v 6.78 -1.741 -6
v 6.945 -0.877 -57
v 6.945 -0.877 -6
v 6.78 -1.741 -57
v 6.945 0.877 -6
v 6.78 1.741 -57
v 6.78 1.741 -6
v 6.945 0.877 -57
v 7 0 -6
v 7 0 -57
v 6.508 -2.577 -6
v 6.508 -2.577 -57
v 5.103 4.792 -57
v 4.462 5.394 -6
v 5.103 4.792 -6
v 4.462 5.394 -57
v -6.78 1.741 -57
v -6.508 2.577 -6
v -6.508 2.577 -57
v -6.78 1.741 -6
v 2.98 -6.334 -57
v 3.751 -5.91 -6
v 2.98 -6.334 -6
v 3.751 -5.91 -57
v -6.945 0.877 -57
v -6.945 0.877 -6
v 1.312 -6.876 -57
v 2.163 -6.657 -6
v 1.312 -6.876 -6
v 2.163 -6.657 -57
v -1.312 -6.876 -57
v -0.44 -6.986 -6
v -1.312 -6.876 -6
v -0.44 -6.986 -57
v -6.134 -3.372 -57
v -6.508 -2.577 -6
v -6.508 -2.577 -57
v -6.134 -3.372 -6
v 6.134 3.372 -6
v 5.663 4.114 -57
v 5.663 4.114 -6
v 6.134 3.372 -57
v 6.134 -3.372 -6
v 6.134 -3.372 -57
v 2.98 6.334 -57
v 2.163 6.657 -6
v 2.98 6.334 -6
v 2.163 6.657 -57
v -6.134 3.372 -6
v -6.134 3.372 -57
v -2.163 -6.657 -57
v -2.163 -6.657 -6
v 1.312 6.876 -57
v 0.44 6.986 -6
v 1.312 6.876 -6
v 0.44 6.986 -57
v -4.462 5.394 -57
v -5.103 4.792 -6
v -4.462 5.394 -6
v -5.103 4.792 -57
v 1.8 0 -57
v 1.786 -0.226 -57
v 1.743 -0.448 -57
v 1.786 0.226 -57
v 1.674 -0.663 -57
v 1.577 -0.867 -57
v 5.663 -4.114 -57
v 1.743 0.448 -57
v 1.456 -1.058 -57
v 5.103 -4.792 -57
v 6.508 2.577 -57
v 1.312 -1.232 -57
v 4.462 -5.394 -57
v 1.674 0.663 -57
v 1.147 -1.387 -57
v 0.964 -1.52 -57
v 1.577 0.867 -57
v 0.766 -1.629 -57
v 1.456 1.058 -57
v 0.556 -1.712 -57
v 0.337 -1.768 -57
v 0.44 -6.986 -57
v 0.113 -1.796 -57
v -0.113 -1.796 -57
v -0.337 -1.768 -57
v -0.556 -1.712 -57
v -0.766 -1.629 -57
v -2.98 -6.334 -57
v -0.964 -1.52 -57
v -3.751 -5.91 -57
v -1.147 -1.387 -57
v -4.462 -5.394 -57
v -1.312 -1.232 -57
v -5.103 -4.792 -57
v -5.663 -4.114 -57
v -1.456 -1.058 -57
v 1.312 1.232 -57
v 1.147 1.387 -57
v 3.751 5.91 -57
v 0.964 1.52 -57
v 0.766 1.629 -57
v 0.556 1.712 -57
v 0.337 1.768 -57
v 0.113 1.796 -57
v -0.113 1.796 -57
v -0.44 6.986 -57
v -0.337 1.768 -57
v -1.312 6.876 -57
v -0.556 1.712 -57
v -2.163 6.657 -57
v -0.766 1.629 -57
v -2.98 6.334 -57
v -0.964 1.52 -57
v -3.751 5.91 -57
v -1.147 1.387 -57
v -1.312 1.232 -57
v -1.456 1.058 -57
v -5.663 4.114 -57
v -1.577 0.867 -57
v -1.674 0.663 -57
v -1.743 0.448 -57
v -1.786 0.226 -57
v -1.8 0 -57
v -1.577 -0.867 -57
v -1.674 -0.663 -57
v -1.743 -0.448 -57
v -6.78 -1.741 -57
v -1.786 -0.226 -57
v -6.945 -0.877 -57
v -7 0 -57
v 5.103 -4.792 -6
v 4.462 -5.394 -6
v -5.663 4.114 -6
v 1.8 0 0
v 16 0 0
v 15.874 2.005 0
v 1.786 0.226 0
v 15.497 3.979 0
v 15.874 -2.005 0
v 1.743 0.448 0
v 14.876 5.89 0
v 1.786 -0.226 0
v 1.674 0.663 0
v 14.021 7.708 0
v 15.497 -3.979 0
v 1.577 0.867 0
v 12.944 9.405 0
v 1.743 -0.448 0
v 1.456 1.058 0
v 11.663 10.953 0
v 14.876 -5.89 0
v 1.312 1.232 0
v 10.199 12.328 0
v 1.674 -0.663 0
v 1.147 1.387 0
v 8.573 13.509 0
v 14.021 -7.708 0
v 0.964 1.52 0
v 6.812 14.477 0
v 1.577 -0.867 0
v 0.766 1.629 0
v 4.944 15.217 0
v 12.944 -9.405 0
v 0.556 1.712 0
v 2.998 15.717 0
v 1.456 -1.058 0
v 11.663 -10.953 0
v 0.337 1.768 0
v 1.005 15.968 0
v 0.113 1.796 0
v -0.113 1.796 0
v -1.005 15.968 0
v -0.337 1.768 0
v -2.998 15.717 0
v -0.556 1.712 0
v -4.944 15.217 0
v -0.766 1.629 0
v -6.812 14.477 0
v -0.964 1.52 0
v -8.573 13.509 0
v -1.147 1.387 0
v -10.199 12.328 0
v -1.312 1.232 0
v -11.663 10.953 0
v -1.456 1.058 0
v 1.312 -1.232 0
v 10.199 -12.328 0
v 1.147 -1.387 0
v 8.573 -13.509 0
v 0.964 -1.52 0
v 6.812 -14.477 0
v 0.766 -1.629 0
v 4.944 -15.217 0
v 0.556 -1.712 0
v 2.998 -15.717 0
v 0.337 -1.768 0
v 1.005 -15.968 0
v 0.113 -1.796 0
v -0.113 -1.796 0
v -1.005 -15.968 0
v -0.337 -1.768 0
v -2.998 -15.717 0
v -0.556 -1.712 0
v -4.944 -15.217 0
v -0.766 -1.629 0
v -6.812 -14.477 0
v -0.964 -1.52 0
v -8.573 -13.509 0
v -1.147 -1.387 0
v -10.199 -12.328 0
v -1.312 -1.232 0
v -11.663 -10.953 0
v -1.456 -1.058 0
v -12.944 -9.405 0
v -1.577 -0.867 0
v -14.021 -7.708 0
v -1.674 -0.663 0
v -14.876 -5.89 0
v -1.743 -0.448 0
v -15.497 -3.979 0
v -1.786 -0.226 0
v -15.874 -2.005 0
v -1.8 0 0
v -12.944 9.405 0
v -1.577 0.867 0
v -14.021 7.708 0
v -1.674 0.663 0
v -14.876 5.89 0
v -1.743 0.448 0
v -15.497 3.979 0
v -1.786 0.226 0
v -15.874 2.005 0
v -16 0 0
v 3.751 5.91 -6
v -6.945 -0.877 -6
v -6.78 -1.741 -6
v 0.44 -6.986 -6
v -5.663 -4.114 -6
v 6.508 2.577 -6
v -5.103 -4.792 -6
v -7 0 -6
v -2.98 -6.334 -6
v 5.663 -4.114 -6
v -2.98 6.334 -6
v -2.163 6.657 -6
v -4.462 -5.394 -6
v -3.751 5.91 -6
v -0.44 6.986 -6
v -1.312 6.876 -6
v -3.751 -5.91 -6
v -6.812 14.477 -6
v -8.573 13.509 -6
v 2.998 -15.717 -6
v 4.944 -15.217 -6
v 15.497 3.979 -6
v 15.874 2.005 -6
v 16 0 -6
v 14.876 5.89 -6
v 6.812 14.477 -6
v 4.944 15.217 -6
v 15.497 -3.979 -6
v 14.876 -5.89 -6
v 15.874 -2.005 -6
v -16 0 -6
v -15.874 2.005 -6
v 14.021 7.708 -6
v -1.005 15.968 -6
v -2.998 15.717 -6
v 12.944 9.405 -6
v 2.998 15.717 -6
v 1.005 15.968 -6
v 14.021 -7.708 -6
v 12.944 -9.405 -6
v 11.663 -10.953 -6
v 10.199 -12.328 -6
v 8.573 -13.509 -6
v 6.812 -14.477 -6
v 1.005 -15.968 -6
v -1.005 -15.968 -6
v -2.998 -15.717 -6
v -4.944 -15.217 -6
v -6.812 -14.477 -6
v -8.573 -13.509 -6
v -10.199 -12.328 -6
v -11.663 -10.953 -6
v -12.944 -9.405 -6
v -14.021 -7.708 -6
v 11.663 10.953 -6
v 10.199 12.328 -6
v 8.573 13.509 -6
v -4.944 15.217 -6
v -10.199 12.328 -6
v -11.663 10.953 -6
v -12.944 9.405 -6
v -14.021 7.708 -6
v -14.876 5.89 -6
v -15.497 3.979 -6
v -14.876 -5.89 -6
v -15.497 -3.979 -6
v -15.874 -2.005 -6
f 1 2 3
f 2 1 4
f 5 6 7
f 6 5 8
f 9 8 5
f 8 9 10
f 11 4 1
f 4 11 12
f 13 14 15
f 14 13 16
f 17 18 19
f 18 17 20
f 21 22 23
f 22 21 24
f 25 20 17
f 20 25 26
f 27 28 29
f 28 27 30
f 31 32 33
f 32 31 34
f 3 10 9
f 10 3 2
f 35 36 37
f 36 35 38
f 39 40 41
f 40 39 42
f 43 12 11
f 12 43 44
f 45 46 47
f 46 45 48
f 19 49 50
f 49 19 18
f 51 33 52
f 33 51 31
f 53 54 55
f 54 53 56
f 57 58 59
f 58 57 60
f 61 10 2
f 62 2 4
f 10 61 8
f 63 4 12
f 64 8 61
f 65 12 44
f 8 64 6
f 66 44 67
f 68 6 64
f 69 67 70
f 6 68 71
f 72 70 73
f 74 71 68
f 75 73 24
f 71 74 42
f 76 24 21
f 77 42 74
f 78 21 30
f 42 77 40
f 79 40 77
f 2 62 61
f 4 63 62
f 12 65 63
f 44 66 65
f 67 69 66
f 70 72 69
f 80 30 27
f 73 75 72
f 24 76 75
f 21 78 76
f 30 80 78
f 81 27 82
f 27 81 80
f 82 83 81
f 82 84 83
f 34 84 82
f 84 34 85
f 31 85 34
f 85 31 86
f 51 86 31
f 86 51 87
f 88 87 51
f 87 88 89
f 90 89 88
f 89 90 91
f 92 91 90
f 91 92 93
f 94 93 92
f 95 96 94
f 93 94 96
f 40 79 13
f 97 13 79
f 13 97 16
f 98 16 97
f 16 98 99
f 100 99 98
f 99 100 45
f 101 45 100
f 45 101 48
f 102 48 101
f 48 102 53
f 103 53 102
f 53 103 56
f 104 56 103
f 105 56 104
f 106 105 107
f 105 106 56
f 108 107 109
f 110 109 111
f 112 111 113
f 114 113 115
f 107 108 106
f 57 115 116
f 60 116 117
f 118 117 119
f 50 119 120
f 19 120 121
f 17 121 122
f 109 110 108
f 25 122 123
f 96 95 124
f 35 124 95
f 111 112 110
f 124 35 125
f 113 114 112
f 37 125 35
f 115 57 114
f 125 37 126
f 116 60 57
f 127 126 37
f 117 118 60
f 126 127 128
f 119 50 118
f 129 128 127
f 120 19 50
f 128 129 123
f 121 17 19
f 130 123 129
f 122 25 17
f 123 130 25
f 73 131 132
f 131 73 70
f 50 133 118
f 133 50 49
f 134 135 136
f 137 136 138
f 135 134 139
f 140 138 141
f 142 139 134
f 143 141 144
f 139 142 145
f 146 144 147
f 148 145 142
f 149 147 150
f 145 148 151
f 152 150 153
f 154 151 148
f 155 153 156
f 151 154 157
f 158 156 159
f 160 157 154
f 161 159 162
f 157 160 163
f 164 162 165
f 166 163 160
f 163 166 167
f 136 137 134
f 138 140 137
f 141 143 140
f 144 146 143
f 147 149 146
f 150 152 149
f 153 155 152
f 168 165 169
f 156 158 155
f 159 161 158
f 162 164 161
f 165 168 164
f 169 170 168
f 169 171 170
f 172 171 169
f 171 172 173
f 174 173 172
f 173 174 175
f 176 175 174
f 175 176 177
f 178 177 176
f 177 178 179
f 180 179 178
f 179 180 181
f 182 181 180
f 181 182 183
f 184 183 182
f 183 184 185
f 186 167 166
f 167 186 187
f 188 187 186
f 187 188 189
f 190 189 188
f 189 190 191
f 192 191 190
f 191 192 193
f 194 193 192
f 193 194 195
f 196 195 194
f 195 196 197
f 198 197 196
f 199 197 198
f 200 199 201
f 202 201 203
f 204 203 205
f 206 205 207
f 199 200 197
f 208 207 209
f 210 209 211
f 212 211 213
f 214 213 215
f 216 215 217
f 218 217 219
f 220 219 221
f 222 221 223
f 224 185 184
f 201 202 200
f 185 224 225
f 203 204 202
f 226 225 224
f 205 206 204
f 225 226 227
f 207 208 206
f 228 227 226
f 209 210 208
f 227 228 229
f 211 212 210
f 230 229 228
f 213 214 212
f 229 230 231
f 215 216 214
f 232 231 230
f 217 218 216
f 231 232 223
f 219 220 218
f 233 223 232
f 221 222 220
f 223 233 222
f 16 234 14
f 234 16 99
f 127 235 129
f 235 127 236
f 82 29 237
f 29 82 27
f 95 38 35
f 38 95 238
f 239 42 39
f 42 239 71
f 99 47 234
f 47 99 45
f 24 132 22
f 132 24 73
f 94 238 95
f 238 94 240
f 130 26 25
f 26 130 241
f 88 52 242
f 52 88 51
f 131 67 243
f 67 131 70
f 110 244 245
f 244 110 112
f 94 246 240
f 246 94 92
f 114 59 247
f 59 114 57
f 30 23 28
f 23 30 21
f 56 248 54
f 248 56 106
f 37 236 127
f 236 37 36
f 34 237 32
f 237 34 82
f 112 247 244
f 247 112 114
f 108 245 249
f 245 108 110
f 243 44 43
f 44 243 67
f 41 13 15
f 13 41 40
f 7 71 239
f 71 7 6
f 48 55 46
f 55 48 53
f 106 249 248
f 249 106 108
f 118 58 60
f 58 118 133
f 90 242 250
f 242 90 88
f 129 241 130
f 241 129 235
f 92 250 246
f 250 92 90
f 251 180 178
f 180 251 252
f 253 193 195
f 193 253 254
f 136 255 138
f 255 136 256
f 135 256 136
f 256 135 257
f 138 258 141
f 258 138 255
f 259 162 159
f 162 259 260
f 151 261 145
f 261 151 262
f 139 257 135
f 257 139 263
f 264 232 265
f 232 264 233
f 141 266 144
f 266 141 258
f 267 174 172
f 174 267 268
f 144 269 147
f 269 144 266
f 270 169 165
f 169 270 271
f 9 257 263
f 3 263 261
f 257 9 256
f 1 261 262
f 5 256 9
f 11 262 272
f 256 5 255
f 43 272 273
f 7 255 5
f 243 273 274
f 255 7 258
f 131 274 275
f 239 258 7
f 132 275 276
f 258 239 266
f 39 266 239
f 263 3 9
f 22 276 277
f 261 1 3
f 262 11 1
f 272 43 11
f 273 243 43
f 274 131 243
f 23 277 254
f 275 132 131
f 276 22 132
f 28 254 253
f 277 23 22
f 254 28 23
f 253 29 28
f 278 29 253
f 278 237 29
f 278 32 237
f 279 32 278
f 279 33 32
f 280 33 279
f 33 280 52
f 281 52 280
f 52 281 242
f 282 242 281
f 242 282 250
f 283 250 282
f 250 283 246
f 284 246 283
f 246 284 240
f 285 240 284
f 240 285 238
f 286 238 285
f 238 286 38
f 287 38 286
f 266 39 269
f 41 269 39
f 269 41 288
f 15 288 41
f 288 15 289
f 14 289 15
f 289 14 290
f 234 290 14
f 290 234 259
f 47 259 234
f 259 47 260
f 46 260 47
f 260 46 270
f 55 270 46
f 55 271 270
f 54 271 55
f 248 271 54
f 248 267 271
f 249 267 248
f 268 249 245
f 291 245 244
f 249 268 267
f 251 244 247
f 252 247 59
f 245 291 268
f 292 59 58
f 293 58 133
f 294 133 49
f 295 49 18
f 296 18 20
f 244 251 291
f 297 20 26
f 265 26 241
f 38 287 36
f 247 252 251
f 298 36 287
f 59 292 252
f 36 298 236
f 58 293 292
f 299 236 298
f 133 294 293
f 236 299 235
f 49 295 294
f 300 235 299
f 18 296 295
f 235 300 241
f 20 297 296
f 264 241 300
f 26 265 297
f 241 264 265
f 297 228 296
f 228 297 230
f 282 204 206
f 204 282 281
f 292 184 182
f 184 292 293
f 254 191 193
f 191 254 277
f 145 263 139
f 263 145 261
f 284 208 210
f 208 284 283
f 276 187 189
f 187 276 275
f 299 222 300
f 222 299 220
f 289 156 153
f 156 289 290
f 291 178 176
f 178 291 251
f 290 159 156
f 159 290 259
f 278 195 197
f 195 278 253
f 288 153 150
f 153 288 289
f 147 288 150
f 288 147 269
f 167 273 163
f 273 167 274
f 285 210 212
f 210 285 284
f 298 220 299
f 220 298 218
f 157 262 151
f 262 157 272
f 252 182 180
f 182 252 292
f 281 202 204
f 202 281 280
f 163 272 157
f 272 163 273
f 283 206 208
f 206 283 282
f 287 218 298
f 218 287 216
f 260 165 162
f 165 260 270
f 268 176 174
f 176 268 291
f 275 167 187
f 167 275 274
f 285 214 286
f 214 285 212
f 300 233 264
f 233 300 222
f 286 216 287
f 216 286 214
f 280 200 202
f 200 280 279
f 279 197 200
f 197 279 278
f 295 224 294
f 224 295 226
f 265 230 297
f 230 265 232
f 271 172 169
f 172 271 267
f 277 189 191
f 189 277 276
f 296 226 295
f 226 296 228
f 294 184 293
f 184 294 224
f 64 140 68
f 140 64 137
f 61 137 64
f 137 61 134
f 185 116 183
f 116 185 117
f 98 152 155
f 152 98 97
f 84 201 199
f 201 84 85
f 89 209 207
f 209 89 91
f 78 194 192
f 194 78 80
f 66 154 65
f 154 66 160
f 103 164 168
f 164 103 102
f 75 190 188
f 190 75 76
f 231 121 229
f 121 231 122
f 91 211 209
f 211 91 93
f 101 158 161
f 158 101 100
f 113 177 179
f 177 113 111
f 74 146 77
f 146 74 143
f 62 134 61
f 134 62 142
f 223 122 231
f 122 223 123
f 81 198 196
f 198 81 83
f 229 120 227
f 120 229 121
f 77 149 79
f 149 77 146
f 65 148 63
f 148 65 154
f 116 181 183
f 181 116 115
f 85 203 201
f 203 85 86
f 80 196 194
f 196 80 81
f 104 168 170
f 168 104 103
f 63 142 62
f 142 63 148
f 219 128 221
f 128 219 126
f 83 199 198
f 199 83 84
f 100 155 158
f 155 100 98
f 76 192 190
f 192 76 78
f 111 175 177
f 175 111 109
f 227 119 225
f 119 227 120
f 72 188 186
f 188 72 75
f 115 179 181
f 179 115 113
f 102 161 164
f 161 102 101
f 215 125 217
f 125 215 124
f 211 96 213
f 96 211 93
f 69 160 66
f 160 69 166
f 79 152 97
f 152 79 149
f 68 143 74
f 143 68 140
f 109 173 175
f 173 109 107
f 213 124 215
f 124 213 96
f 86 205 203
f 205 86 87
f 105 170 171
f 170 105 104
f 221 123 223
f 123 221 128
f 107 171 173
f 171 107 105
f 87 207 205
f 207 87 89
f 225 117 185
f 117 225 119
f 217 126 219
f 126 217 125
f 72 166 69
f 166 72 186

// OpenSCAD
$fn = 50;


difference() {
	union() {
		translate(v = [0, 0, -57.0000000000]) {
			cylinder(h = 57, r = 7.0000000000);
		}
		translate(v = [0, 0, -6.0000000000]) {
			cylinder(h = 6, r = 16.0000000000);
		}
	}
	union() {
		#translate(v = [0, 0, -57]) {
			cylinder(h = 57, r = 1.8000000000);
		}
	}
}
